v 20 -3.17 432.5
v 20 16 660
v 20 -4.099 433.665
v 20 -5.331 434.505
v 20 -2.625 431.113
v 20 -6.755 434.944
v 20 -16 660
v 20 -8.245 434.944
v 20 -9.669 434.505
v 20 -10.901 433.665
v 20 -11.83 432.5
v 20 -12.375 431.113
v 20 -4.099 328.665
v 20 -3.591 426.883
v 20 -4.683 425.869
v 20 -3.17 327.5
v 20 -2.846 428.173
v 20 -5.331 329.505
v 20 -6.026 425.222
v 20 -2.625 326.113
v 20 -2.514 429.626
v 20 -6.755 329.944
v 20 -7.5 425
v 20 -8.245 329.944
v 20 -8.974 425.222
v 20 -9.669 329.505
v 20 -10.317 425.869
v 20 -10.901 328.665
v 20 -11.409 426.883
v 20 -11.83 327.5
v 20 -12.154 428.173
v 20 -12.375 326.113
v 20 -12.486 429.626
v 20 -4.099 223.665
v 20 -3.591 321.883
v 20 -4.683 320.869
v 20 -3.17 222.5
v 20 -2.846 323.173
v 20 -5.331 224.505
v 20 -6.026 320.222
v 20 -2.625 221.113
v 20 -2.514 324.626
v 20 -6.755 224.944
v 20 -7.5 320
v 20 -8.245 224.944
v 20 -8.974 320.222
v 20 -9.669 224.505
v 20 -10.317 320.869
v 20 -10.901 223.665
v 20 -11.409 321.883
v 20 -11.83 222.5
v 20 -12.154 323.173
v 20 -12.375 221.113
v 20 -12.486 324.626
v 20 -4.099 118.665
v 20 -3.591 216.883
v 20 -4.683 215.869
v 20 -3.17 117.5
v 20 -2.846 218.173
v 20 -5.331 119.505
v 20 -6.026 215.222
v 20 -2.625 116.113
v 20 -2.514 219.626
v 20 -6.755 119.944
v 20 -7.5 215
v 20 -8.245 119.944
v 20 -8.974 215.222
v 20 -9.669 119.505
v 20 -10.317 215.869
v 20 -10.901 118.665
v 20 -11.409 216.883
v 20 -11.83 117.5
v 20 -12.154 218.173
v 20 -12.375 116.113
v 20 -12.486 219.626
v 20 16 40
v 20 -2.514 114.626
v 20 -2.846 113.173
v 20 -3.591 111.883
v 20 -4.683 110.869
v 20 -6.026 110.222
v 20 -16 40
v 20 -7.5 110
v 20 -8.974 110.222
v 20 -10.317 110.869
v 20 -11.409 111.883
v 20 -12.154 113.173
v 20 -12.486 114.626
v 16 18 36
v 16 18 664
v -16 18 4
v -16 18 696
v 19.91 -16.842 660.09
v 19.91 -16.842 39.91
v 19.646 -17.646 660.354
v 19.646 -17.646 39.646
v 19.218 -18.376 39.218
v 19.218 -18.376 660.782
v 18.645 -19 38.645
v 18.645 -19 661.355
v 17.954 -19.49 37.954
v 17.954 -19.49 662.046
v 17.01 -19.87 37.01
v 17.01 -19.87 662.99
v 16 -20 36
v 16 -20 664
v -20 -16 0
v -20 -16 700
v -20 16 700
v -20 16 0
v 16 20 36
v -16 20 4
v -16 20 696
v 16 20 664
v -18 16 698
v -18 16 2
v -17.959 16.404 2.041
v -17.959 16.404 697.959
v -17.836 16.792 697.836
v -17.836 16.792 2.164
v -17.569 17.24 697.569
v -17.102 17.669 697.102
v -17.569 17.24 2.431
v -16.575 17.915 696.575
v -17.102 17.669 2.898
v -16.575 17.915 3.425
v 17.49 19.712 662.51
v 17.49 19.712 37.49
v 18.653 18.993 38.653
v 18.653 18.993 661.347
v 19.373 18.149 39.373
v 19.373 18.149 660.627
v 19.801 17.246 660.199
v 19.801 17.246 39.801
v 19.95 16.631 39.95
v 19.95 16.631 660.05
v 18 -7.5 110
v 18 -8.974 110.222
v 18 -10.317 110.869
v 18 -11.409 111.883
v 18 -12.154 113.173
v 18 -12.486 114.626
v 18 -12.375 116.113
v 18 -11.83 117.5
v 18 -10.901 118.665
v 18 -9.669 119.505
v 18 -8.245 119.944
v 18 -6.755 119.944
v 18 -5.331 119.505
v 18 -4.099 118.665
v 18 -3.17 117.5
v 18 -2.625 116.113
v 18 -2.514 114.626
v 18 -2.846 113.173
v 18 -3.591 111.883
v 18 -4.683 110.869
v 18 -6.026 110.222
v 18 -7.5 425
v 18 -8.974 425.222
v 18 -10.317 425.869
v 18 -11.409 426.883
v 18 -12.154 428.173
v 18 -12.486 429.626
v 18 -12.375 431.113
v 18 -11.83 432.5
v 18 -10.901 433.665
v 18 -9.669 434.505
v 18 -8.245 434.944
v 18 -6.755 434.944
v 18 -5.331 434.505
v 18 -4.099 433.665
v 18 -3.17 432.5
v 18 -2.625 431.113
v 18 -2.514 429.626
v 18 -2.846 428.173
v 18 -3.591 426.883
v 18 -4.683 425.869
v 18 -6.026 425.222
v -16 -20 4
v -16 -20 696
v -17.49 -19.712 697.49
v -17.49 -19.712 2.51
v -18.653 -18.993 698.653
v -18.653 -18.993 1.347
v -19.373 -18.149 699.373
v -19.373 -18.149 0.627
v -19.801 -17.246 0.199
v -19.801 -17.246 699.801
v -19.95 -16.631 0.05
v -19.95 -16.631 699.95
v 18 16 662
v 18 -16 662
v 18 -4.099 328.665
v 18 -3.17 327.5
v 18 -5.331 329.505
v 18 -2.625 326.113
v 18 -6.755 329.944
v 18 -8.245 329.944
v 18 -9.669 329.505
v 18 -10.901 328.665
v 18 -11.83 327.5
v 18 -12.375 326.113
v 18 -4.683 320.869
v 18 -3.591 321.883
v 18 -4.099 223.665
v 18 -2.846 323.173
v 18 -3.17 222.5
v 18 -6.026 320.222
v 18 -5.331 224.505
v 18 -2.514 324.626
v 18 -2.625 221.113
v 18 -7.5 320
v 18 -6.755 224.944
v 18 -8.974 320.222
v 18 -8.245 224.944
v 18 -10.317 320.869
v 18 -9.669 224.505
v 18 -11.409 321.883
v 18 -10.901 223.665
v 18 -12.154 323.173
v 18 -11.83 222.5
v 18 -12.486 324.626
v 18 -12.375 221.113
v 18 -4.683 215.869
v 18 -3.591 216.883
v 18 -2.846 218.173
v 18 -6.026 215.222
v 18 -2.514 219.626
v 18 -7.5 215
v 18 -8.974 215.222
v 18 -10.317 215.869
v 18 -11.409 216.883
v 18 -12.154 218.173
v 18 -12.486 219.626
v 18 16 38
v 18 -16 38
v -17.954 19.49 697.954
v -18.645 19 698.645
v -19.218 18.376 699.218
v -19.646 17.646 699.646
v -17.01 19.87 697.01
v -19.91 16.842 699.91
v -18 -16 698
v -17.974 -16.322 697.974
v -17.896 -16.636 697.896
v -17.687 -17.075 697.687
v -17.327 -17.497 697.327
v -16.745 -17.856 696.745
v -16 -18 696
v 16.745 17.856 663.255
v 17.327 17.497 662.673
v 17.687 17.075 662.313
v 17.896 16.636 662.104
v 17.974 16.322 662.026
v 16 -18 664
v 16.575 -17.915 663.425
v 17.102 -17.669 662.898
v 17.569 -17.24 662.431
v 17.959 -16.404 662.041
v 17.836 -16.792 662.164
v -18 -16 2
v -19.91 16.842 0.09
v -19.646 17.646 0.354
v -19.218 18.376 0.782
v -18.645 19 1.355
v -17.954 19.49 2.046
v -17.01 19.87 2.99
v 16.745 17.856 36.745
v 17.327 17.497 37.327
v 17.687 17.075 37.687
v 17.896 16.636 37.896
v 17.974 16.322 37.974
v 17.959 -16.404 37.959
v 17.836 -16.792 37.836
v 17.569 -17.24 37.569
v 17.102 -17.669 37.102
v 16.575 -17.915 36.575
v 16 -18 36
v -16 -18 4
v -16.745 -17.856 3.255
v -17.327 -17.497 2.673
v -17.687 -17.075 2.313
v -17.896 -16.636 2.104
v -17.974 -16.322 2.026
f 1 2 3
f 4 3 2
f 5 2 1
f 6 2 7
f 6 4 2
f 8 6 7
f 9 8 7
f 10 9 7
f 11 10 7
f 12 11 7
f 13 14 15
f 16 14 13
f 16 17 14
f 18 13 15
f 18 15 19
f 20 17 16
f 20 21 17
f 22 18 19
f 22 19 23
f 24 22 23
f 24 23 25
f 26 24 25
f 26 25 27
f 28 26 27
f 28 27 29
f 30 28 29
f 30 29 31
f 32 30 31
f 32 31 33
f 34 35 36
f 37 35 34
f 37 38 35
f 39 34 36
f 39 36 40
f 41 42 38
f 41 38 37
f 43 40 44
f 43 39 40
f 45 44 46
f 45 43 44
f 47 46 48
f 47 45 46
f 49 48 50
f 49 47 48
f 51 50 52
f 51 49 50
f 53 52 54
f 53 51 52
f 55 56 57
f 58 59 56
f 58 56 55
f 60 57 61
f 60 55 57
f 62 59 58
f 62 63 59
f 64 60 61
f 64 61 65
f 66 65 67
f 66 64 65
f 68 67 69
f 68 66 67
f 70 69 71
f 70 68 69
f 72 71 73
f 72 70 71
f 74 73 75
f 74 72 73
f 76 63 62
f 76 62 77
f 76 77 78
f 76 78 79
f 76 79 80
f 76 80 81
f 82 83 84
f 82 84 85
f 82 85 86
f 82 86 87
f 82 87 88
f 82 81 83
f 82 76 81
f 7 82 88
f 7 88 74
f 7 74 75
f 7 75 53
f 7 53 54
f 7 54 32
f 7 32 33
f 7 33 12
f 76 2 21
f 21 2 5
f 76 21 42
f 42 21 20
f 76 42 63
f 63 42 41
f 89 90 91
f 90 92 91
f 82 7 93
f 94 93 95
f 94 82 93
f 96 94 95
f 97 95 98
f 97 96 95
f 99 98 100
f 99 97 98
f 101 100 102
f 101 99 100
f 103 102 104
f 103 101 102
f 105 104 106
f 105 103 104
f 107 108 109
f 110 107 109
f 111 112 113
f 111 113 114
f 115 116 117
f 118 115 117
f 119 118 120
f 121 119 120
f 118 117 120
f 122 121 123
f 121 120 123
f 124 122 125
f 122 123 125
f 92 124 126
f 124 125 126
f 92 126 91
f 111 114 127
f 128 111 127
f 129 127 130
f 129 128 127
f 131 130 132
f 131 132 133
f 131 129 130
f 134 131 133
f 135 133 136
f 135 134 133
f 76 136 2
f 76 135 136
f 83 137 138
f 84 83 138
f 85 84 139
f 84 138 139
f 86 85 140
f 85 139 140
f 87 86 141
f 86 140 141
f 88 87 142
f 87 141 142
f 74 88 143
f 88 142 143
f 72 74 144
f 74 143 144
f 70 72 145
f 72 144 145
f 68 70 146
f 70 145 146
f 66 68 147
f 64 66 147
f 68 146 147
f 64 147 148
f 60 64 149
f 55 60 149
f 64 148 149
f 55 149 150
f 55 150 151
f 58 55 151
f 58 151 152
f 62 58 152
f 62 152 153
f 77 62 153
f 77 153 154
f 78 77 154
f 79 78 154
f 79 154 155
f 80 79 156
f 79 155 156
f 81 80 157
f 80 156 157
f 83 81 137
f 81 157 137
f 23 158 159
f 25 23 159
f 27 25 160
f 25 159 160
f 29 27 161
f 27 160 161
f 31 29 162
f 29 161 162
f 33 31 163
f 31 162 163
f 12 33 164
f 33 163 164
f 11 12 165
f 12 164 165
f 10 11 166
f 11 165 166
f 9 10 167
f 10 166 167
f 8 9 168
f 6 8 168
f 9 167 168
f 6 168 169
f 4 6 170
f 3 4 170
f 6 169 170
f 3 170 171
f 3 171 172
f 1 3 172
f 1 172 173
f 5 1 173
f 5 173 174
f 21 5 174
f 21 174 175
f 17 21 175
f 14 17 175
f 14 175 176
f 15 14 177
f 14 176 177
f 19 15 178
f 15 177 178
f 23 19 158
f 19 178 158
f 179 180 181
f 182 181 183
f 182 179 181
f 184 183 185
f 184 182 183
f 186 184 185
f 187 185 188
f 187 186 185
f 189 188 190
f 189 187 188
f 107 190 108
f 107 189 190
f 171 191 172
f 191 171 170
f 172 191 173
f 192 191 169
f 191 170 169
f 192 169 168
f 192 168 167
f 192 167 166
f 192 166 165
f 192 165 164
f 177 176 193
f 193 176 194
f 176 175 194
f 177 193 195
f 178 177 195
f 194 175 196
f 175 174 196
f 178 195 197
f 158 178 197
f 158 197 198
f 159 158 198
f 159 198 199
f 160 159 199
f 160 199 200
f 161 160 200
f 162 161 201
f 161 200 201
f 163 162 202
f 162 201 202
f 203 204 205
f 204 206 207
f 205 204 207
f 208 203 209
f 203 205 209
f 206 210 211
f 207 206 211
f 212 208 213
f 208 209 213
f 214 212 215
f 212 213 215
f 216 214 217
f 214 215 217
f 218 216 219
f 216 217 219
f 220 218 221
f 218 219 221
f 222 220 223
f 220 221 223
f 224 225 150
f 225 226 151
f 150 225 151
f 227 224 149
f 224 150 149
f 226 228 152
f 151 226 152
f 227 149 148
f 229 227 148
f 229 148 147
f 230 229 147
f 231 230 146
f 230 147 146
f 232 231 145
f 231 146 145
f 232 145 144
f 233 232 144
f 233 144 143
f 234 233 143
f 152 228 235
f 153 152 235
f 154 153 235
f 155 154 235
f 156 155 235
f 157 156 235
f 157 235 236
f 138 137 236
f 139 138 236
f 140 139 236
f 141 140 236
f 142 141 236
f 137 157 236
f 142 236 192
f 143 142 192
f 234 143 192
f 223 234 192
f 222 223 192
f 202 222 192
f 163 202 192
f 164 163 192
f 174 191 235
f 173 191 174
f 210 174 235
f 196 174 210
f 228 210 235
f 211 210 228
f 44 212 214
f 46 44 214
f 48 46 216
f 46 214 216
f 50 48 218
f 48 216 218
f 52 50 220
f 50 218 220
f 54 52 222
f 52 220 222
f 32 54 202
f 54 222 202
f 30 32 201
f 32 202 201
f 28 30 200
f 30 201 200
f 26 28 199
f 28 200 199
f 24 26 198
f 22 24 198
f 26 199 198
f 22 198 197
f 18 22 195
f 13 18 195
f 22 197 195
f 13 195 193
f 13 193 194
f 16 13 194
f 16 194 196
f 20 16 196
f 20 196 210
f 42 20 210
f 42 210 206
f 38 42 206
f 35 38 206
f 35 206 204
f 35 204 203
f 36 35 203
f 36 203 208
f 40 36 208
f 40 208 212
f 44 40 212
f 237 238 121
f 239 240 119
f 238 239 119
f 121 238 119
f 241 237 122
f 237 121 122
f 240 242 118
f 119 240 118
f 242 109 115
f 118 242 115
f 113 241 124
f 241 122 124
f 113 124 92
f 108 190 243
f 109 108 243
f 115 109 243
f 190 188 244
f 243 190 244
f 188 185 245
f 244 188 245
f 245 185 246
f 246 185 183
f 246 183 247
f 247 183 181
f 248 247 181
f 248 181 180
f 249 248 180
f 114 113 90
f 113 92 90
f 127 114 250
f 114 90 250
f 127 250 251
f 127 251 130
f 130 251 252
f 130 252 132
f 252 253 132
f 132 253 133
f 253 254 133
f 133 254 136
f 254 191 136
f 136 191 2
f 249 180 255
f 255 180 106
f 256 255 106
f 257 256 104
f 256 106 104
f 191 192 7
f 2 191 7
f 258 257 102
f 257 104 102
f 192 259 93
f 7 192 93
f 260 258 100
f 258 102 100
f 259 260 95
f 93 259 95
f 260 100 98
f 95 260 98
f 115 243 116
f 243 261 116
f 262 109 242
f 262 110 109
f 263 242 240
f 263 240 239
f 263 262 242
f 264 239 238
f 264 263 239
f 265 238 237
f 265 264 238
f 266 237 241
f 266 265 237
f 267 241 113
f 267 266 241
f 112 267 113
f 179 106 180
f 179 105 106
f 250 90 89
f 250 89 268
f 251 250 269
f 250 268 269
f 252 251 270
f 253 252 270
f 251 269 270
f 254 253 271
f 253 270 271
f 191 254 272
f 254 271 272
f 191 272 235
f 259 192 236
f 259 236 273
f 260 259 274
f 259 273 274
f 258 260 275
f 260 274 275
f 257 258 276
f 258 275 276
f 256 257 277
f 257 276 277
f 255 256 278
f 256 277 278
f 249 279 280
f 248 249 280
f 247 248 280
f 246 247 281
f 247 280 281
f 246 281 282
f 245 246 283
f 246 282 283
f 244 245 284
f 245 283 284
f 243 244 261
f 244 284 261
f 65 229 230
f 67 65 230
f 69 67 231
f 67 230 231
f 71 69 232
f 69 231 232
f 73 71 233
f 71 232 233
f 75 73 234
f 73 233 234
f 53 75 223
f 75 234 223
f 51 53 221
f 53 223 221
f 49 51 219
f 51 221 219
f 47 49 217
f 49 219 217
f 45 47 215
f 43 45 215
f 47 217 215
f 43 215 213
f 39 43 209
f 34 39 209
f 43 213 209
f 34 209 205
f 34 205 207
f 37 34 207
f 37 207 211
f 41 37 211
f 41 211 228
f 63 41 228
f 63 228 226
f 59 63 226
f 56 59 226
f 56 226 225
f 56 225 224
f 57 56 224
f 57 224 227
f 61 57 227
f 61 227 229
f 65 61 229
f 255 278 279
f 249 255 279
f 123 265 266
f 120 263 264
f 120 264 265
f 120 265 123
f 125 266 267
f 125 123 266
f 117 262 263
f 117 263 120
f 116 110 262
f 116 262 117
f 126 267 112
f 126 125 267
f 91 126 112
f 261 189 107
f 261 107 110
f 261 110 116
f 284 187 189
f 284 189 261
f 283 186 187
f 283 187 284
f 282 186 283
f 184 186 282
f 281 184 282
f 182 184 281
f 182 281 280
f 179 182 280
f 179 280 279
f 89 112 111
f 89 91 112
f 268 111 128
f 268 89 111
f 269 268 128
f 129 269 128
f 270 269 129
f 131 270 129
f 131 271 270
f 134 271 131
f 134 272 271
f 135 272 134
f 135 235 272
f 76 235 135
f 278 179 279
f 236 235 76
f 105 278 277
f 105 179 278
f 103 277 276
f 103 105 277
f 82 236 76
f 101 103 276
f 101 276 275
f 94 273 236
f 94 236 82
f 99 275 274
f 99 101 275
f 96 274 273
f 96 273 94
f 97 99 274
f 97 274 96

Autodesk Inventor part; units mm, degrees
ref_plane "YZ Plane" through (0, 0, 0) normal (1, 0, 0) x (0, 1, 0)
ref_plane "Piano iniziale" through (0, 0, 0) normal (0, 0, 1) x (1, 0, 0)
ref_plane "Piano finale" through (0, 0, 700) normal (0, 0, 1) x (1, 0, 0)
sketch "Schizzo" plane through (0, 0, 0) normal (0, 0, 1) x (1, 0, 0)
  line L0 (-20, -16) -> (-20, 16)
  line L1 (-16, 20) -> (16, 20)
  line L2 (20, 16) -> (20, -16)
  line L3 (16, -20) -> (-16, -20)
  arc A0 (-20, -16) -> (-16, -20) centre (-16, -16) ccw
  arc A1 (20, 16) -> (16, 20) centre (16, 16) ccw
  arc A2 (-16, 20) -> (-20, 16) centre (-16, 16) ccw
  arc A3 (16, -20) -> (20, -16) centre (16, -16) ccw
  arc A4 (-16, 18) -> (-18, 16) centre (-16, 16) ccw
  line L4 (-16, 18) -> (16, 18)
  arc A5 (18, 16) -> (16, 18) centre (16, 16) ccw
  line L5 (18, 16) -> (18, -16)
  arc A6 (16, -18) -> (18, -16) centre (16, -16) ccw
  line L6 (16, -18) -> (-16, -18)
  arc A7 (-18, -16) -> (-16, -18) centre (-16, -16) ccw
  line L7 (-18, -16) -> (-18, 16)
  line L8 (0, 29.1598) -> (0, -29.1598) construction
  line L9 (-29.1598, 0) -> (29.1598, 0) construction
  dimension "d7" = 4
  dimension "d9" = 40
  dimension "d11" = 40
  dimension "d12" = 2
  dimension "d15" = 20
  dimension "d16" = 20
extrude "Corpo" add sketch "Schizzo" along normal up to surface (700 mm away) from surface at 0
sketch "Sketch3" plane through (0, 0, 0) normal (0, 0, 1) x (1, 0, 0)
  line L0 (0, 0) -> (10, 0)
ref_plane "Work Plane3" through (0, 0, 0) normal (0, -1, 0) x (1, 0, 0)
sketch "Sketch4" plane through (0, 0, 0) normal (0, -1, 0) x (1, 0, 0)
  line L0 (-2, 0) -> (12, 0)
  line L1 (-2, 700) -> (12, 700)
  dimension "d18" = 700
sketch "Schizzo5" plane through (-16, -20, 0) normal (0, -1, 0) x (1, 0, 0)
  line L0 (-4, 0) -> (-4, 700) projected
  line L1 (-4, 0) -> (0, 0) projected
  line L2 (-4, 700) -> (0, 700) projected
  line L3 (-4, 700) -> (0, 700) projected
  line L4 (-4, 700) -> (46.6766, 649.3234)
  line L5 (-4, 700) -> (67.6675, 700) construction
  line L6 (46.6766, 649.3234) -> (46.6766, 733.8871)
  line L7 (46.6766, 733.8871) -> (-4, 700)
  line L8 (-4, 0) -> (55.8193, 59.8193)
  line L9 (-4, 0) -> (80.5973, 0) construction
  line L10 (55.8193, 59.8193) -> (55.8193, -51.0015)
  line L11 (55.8193, -51.0015) -> (-4, 0)
  point P0 (16, 0)
  dimension "d19" = 45
  dimension "d20" = 45
extrude "Estrusione2" cut sketch "Schizzo5" against normal up to next
sketch "Schizzo6" plane through (20, -16, 660) normal (1, 0, 0) x (0, 0, -1)
  circle A0 centre (230, 8.5) radius 5 projected
  circle A1 centre (545, 8.5) radius 5 projected
  circle A2 centre (335, 8.5) radius 5 projected
  circle A3 centre (440, 8.5) radius 5 projected
  line L0 (0, 0) -> (0, 32) projected
  line L1 (620, 32) -> (0, 32) projected
  line L2 (620, 0) -> (620, 32) projected
  line L3 (620, 0) -> (0, 0) projected
  point P0 (660, 16)
hole "Foro1" at (20, -7.5, 115) at (20, -7.5, 220) at (20, -7.5, 325) at (20, -7.5, 430) direction (-1, 0, 0) diameter 10 depth 8 tip angle 118
equation "\"d7\" = G_IR"
equation "\"d9\" = G_W"
equation "\"d11\" = G_H"
equation "\"d12\" = G_T"
equation "\"d15\" = 0.5 * d9"
equation "\"d16\" = 0.5 * d11"
equation "\"d3\" = G_L"
equation "\"G_W\" = 40"
equation "\"G_H\" = 40"
equation "\"G_T\" = 2"
equation "\"G_IR\" = 4"
equation "\"G_L\" = d18"
equation "\"G_OFFSET_START\" = 0"
equation "\"G_OFFSET_END\" = 0"
properties part number "ISO 10799-2 - 40x40x2 - 700" material "Acciaio, Dolce"
